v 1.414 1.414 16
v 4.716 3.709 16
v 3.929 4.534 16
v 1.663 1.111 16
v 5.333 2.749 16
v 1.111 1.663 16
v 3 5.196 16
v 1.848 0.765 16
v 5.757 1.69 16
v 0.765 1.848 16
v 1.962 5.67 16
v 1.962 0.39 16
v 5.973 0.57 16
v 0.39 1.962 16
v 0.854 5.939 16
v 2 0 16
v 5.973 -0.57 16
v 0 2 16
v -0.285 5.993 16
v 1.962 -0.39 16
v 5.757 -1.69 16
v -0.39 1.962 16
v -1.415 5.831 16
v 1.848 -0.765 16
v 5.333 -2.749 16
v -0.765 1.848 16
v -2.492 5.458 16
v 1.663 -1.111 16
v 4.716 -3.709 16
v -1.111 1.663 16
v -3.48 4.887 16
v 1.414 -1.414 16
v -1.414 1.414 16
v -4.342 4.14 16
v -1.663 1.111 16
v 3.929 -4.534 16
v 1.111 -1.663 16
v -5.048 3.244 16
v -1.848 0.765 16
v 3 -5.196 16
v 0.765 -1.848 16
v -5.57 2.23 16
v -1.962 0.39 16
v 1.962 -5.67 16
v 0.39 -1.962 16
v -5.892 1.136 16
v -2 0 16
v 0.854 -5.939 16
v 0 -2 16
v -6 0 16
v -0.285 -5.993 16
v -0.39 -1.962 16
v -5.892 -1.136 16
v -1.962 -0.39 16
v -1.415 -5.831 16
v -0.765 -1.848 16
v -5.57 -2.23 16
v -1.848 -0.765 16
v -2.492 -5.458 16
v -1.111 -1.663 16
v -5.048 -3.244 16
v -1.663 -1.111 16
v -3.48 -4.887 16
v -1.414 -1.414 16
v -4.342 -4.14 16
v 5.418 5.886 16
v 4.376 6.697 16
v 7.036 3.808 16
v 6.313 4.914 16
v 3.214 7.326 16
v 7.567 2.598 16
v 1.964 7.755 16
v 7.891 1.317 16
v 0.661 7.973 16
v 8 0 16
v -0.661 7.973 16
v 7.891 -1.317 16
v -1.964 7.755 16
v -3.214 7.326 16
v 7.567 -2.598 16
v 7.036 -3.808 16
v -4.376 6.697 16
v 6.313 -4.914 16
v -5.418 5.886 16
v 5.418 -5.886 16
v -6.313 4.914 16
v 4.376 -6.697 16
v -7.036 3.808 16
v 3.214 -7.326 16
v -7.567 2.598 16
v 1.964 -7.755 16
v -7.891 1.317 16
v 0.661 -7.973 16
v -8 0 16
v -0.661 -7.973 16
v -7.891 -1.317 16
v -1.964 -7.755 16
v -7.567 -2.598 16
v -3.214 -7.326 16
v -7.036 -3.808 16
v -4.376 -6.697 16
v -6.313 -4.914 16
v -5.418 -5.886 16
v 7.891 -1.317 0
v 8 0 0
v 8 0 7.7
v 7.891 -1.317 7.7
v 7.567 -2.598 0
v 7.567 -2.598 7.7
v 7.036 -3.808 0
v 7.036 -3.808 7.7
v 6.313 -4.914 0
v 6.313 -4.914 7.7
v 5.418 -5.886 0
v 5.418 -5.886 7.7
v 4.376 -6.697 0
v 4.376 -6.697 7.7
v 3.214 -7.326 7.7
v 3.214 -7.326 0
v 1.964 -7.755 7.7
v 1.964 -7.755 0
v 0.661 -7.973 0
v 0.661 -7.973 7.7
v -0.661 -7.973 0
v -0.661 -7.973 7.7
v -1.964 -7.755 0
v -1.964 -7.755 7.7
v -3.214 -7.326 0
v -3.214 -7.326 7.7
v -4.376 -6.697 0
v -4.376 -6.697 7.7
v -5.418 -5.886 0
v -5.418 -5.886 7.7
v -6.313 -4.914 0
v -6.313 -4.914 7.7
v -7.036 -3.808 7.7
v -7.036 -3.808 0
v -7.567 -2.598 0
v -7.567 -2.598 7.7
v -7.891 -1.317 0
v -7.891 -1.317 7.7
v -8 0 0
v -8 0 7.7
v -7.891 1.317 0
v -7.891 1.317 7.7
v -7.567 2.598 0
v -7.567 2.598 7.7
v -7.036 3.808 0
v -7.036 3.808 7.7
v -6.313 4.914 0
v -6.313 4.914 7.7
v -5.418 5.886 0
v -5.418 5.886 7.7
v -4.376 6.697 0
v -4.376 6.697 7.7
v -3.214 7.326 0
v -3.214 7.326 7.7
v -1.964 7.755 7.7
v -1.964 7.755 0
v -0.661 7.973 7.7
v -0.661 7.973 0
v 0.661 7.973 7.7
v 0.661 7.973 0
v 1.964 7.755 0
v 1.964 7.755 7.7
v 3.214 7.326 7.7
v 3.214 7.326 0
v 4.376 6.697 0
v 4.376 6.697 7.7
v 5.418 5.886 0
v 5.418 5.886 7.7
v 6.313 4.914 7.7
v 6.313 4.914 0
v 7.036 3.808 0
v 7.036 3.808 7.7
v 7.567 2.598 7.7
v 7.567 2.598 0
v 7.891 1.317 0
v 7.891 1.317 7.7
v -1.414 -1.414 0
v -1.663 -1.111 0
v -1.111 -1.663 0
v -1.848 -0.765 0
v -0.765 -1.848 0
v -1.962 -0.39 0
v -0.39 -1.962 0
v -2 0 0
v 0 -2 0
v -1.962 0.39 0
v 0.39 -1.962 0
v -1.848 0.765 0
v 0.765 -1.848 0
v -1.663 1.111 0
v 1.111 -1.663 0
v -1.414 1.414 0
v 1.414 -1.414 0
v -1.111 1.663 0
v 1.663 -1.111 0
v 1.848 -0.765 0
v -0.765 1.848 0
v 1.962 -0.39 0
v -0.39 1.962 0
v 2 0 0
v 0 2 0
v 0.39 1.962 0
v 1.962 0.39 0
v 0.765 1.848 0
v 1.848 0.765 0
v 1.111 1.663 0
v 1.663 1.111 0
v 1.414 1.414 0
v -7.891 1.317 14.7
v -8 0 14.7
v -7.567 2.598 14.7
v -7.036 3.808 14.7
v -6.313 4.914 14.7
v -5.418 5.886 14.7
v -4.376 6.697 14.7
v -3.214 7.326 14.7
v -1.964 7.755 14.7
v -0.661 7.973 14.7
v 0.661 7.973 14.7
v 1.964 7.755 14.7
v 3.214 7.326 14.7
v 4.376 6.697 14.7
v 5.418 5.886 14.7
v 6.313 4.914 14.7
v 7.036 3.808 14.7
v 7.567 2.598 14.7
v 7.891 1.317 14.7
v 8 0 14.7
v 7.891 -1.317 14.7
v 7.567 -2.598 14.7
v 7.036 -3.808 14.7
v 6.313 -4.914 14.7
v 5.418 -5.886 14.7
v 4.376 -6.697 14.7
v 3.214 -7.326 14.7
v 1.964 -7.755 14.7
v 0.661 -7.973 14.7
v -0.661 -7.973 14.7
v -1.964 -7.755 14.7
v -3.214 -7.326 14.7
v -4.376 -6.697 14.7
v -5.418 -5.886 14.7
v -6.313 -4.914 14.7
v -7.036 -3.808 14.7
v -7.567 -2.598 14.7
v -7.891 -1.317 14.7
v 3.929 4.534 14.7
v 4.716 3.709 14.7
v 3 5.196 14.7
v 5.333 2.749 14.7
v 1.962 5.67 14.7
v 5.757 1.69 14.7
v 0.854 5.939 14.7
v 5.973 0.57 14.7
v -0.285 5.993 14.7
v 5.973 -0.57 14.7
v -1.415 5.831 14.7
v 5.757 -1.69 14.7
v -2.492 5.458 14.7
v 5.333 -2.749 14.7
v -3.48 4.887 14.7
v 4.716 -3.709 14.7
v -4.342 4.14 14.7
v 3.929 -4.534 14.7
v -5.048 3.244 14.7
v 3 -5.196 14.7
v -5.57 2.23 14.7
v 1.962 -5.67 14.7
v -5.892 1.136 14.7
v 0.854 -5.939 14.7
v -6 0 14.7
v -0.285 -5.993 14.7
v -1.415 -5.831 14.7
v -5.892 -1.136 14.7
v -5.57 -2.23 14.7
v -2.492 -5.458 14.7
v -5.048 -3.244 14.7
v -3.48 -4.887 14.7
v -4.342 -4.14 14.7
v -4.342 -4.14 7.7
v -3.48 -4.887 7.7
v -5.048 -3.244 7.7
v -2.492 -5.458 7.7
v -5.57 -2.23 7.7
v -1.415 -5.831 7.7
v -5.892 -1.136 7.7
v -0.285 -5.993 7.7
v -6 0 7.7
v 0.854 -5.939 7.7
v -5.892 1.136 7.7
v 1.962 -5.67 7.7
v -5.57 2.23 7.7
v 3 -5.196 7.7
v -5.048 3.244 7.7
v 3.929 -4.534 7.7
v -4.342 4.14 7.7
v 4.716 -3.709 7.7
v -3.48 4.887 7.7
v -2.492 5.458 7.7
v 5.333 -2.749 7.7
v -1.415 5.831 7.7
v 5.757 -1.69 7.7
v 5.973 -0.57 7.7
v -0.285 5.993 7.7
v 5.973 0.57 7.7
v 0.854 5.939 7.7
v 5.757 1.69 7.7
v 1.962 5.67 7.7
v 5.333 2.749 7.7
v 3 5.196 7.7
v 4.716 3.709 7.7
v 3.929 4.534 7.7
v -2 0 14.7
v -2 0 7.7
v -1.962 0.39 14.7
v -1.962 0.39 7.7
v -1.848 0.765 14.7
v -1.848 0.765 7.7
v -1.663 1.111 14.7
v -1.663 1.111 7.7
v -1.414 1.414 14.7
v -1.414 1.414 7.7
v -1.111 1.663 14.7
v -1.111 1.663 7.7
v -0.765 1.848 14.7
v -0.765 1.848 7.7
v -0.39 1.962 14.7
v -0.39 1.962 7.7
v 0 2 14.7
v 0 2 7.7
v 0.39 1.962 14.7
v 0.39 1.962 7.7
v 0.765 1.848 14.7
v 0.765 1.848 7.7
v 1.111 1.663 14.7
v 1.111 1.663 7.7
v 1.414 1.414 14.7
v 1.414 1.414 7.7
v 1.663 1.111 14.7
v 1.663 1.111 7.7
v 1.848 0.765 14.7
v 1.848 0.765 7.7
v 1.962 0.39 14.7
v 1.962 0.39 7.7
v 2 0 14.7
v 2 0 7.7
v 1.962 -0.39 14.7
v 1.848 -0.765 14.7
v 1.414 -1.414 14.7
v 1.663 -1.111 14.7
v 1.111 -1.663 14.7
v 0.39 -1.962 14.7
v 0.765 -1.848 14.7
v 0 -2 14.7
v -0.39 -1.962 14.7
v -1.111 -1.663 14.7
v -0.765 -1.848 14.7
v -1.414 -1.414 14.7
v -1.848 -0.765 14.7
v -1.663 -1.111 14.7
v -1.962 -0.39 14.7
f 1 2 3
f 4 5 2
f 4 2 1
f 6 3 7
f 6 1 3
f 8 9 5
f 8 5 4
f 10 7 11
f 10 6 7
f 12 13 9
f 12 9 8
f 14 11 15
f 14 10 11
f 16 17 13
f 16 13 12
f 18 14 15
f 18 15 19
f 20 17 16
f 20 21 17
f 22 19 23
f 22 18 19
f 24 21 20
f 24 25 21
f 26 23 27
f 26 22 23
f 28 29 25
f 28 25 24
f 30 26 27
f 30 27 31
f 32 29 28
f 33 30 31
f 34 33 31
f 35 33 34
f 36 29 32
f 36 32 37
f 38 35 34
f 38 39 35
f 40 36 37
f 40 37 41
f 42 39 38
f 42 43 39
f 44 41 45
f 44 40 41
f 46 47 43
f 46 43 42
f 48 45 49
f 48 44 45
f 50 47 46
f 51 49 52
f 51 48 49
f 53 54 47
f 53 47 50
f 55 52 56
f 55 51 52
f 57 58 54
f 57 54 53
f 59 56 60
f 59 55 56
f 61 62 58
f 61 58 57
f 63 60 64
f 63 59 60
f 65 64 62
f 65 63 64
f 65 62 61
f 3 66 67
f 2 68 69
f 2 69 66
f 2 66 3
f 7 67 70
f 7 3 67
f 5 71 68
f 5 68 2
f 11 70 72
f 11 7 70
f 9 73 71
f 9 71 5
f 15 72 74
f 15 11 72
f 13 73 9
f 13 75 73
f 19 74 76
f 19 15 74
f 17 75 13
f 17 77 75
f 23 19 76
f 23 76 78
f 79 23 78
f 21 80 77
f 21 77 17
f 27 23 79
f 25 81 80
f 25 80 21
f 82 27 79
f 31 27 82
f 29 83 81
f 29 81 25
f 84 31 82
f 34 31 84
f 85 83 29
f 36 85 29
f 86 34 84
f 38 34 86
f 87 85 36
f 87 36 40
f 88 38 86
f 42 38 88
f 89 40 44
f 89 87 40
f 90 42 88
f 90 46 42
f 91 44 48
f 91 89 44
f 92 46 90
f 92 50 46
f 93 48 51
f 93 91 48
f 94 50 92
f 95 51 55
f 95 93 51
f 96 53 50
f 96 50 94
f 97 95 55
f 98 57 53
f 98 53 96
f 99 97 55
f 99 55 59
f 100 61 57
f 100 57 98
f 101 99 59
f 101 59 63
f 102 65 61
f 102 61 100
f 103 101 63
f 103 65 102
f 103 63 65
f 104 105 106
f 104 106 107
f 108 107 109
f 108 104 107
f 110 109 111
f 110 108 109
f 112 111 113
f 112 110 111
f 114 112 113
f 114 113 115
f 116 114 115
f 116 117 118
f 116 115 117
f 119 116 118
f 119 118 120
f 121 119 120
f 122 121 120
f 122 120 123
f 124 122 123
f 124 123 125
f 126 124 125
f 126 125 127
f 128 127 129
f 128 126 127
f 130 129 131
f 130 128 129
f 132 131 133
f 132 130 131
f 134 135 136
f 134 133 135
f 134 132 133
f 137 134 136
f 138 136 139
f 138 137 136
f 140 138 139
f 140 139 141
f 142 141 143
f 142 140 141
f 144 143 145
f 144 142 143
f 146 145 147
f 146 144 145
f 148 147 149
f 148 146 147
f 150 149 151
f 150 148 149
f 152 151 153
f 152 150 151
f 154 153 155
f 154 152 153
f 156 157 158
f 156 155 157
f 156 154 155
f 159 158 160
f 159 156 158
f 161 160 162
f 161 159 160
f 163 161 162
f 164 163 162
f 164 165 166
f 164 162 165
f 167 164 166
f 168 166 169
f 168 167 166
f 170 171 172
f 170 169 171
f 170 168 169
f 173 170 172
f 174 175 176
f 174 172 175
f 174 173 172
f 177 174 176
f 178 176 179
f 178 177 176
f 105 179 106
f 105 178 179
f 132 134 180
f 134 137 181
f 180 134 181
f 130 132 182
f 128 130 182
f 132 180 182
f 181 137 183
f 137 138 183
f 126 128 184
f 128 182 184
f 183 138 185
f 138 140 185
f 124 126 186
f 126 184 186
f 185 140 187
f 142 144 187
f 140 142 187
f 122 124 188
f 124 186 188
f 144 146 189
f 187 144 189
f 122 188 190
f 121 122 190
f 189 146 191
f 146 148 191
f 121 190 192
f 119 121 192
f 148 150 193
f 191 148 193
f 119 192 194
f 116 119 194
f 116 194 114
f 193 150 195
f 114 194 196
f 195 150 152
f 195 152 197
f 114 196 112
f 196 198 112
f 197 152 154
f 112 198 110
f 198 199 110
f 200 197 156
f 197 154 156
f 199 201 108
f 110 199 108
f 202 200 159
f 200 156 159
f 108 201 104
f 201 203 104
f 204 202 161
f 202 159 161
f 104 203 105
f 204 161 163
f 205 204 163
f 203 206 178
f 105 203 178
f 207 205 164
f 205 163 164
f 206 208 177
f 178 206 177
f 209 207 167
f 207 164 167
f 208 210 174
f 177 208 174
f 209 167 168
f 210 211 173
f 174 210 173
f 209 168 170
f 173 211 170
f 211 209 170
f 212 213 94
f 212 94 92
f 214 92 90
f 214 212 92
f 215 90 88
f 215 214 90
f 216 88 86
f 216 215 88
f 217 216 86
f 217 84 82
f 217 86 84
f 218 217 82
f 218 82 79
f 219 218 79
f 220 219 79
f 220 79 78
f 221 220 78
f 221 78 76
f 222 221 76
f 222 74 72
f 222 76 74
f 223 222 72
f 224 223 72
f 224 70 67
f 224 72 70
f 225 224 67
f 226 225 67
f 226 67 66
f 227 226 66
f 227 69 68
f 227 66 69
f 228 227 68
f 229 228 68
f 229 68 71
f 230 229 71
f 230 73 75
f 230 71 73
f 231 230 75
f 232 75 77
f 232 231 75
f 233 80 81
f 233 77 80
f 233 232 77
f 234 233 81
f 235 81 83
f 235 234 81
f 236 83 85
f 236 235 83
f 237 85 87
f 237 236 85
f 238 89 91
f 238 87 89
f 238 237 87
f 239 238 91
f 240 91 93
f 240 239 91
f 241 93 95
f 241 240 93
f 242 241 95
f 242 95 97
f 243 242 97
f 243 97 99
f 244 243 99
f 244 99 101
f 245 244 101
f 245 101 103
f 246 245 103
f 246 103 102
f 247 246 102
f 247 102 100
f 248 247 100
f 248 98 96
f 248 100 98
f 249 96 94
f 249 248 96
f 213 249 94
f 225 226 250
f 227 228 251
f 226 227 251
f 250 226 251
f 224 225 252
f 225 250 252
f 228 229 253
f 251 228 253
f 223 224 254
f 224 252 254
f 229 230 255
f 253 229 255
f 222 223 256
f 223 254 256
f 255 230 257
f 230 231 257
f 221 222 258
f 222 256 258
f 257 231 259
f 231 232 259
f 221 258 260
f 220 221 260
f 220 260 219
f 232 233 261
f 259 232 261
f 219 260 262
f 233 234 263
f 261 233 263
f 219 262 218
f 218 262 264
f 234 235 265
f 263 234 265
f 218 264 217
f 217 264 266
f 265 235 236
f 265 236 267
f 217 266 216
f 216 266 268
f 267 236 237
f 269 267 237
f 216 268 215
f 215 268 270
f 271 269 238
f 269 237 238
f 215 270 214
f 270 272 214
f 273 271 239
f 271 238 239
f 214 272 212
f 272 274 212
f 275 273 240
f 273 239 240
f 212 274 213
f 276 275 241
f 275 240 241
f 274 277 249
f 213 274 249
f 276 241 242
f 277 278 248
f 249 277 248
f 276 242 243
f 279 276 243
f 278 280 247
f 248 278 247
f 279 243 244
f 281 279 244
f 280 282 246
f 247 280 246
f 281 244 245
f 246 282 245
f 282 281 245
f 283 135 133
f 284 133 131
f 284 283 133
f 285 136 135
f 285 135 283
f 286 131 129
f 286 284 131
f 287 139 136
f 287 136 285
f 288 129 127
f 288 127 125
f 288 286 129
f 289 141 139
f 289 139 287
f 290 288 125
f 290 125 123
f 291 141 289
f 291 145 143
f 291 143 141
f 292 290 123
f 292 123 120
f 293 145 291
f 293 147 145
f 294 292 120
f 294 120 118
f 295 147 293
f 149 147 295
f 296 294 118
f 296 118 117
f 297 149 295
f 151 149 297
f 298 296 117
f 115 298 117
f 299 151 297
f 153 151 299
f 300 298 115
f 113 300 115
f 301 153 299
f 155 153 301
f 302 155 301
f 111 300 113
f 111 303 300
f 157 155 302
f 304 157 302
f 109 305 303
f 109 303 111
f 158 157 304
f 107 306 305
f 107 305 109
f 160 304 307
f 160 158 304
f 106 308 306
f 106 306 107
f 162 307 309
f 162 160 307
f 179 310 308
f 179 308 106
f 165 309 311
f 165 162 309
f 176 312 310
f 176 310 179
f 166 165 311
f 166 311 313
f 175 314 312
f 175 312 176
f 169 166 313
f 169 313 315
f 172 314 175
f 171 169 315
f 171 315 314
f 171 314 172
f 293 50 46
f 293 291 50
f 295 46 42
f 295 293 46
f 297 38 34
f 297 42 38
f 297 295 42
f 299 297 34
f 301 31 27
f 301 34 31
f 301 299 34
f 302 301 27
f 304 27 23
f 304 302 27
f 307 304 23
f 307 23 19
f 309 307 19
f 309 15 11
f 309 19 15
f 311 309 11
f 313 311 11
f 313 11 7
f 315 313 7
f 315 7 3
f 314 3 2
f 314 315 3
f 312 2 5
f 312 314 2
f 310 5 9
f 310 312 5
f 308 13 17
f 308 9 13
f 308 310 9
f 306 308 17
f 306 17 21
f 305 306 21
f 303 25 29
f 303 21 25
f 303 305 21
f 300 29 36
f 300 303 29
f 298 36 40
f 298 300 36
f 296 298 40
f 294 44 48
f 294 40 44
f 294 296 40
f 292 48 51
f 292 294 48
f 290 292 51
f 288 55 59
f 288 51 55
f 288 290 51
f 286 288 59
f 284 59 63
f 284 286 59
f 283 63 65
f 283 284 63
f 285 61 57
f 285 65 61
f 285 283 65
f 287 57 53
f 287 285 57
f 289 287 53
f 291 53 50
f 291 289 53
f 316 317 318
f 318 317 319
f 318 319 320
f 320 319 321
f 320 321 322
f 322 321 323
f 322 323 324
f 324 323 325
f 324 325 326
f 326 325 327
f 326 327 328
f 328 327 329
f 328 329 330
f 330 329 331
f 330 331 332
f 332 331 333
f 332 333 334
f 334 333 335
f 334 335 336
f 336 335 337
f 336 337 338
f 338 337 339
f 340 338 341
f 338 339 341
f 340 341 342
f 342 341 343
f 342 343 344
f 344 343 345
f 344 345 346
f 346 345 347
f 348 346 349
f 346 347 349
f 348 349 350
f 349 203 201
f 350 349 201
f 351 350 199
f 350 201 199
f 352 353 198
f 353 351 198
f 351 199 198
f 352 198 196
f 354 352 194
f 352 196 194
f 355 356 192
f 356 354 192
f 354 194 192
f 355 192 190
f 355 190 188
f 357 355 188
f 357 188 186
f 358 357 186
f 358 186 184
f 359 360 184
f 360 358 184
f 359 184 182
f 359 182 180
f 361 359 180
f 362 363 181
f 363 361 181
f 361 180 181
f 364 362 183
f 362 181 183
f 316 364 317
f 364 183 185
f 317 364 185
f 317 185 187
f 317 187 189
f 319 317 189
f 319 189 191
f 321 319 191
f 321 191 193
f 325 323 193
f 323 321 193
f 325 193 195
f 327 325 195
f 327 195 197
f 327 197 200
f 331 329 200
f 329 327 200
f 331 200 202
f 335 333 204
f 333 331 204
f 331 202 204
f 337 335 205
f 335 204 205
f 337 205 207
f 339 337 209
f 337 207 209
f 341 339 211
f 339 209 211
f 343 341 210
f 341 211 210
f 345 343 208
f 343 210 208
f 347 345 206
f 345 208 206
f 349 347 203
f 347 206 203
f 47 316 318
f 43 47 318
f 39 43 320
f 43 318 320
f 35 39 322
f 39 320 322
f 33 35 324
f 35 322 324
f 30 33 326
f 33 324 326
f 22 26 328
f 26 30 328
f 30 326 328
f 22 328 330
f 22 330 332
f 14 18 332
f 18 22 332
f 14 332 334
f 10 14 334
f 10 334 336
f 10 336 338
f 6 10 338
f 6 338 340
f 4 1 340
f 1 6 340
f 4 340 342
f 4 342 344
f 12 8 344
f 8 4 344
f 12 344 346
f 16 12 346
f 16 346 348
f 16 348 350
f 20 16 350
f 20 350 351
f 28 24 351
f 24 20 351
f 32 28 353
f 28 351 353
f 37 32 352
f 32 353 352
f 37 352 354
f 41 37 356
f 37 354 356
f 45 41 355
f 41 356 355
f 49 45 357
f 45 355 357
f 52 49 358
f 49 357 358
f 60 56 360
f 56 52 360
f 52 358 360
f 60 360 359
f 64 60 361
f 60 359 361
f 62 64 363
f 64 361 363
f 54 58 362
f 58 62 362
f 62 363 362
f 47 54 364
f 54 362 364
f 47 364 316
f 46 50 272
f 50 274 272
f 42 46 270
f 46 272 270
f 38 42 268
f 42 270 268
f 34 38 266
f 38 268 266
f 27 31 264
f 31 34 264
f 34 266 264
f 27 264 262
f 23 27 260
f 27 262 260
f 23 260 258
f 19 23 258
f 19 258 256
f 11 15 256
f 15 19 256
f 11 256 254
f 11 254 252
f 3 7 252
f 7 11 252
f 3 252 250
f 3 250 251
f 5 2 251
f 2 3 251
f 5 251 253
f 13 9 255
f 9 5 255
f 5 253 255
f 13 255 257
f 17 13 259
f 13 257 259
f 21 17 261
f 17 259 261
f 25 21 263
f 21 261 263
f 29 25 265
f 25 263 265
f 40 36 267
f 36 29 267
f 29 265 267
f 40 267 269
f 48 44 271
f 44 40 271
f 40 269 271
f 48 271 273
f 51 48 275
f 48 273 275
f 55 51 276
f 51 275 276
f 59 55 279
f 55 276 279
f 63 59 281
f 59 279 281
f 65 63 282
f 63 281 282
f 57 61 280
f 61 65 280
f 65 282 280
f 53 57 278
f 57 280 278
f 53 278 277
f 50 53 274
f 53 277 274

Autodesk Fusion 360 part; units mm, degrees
sketch "Skizze1" plane through (0, 0, 0) normal (0, 0, 1) x (1, 0, 0)
  circle A0 centre (0, 0) radius 8
  circle A1 centre (0, 0) radius 2
  dimension "d1" = 16
  dimension "d2" = 4
extrude "Extrusion1" add sketch "Skizze1" along normal blind 7.7 makes body 1
sketch "Skizze2" plane through (0, 0, 7.7) normal (0, 0, 1) x (-1, 0, 0)
  circle A0 centre (0, 0) radius 2
  circle A1 centre (0, 0) radius 8
  circle A2 centre (0, 0) radius 2
  circle A3 centre (0, 0) radius 6
  dimension "d5" = 4
  dimension "d6" = 12
extrude "Extrusion2" add sketch "Skizze2" along normal blind 7 contours A3 bodies 1
sketch "Skizze3" plane through (0, 0, 14.7) normal (0, 0, 1) x (-1, 0, 0)
  circle A0 centre (0, 0) radius 2
  circle A1 centre (0, 0) radius 6
  circle A2 centre (0, 0) radius 2
  circle A3 centre (0, 0) radius 8
  dimension "d9" = 4
  dimension "d10" = 16
extrude "Extrusion4" add sketch "Skizze3" along normal blind 1.3 separate body contours A3 makes body 2
extrude "Extrusion3" add sketch "Skizze3" along normal blind 1.3 contours A1 bodies 1
